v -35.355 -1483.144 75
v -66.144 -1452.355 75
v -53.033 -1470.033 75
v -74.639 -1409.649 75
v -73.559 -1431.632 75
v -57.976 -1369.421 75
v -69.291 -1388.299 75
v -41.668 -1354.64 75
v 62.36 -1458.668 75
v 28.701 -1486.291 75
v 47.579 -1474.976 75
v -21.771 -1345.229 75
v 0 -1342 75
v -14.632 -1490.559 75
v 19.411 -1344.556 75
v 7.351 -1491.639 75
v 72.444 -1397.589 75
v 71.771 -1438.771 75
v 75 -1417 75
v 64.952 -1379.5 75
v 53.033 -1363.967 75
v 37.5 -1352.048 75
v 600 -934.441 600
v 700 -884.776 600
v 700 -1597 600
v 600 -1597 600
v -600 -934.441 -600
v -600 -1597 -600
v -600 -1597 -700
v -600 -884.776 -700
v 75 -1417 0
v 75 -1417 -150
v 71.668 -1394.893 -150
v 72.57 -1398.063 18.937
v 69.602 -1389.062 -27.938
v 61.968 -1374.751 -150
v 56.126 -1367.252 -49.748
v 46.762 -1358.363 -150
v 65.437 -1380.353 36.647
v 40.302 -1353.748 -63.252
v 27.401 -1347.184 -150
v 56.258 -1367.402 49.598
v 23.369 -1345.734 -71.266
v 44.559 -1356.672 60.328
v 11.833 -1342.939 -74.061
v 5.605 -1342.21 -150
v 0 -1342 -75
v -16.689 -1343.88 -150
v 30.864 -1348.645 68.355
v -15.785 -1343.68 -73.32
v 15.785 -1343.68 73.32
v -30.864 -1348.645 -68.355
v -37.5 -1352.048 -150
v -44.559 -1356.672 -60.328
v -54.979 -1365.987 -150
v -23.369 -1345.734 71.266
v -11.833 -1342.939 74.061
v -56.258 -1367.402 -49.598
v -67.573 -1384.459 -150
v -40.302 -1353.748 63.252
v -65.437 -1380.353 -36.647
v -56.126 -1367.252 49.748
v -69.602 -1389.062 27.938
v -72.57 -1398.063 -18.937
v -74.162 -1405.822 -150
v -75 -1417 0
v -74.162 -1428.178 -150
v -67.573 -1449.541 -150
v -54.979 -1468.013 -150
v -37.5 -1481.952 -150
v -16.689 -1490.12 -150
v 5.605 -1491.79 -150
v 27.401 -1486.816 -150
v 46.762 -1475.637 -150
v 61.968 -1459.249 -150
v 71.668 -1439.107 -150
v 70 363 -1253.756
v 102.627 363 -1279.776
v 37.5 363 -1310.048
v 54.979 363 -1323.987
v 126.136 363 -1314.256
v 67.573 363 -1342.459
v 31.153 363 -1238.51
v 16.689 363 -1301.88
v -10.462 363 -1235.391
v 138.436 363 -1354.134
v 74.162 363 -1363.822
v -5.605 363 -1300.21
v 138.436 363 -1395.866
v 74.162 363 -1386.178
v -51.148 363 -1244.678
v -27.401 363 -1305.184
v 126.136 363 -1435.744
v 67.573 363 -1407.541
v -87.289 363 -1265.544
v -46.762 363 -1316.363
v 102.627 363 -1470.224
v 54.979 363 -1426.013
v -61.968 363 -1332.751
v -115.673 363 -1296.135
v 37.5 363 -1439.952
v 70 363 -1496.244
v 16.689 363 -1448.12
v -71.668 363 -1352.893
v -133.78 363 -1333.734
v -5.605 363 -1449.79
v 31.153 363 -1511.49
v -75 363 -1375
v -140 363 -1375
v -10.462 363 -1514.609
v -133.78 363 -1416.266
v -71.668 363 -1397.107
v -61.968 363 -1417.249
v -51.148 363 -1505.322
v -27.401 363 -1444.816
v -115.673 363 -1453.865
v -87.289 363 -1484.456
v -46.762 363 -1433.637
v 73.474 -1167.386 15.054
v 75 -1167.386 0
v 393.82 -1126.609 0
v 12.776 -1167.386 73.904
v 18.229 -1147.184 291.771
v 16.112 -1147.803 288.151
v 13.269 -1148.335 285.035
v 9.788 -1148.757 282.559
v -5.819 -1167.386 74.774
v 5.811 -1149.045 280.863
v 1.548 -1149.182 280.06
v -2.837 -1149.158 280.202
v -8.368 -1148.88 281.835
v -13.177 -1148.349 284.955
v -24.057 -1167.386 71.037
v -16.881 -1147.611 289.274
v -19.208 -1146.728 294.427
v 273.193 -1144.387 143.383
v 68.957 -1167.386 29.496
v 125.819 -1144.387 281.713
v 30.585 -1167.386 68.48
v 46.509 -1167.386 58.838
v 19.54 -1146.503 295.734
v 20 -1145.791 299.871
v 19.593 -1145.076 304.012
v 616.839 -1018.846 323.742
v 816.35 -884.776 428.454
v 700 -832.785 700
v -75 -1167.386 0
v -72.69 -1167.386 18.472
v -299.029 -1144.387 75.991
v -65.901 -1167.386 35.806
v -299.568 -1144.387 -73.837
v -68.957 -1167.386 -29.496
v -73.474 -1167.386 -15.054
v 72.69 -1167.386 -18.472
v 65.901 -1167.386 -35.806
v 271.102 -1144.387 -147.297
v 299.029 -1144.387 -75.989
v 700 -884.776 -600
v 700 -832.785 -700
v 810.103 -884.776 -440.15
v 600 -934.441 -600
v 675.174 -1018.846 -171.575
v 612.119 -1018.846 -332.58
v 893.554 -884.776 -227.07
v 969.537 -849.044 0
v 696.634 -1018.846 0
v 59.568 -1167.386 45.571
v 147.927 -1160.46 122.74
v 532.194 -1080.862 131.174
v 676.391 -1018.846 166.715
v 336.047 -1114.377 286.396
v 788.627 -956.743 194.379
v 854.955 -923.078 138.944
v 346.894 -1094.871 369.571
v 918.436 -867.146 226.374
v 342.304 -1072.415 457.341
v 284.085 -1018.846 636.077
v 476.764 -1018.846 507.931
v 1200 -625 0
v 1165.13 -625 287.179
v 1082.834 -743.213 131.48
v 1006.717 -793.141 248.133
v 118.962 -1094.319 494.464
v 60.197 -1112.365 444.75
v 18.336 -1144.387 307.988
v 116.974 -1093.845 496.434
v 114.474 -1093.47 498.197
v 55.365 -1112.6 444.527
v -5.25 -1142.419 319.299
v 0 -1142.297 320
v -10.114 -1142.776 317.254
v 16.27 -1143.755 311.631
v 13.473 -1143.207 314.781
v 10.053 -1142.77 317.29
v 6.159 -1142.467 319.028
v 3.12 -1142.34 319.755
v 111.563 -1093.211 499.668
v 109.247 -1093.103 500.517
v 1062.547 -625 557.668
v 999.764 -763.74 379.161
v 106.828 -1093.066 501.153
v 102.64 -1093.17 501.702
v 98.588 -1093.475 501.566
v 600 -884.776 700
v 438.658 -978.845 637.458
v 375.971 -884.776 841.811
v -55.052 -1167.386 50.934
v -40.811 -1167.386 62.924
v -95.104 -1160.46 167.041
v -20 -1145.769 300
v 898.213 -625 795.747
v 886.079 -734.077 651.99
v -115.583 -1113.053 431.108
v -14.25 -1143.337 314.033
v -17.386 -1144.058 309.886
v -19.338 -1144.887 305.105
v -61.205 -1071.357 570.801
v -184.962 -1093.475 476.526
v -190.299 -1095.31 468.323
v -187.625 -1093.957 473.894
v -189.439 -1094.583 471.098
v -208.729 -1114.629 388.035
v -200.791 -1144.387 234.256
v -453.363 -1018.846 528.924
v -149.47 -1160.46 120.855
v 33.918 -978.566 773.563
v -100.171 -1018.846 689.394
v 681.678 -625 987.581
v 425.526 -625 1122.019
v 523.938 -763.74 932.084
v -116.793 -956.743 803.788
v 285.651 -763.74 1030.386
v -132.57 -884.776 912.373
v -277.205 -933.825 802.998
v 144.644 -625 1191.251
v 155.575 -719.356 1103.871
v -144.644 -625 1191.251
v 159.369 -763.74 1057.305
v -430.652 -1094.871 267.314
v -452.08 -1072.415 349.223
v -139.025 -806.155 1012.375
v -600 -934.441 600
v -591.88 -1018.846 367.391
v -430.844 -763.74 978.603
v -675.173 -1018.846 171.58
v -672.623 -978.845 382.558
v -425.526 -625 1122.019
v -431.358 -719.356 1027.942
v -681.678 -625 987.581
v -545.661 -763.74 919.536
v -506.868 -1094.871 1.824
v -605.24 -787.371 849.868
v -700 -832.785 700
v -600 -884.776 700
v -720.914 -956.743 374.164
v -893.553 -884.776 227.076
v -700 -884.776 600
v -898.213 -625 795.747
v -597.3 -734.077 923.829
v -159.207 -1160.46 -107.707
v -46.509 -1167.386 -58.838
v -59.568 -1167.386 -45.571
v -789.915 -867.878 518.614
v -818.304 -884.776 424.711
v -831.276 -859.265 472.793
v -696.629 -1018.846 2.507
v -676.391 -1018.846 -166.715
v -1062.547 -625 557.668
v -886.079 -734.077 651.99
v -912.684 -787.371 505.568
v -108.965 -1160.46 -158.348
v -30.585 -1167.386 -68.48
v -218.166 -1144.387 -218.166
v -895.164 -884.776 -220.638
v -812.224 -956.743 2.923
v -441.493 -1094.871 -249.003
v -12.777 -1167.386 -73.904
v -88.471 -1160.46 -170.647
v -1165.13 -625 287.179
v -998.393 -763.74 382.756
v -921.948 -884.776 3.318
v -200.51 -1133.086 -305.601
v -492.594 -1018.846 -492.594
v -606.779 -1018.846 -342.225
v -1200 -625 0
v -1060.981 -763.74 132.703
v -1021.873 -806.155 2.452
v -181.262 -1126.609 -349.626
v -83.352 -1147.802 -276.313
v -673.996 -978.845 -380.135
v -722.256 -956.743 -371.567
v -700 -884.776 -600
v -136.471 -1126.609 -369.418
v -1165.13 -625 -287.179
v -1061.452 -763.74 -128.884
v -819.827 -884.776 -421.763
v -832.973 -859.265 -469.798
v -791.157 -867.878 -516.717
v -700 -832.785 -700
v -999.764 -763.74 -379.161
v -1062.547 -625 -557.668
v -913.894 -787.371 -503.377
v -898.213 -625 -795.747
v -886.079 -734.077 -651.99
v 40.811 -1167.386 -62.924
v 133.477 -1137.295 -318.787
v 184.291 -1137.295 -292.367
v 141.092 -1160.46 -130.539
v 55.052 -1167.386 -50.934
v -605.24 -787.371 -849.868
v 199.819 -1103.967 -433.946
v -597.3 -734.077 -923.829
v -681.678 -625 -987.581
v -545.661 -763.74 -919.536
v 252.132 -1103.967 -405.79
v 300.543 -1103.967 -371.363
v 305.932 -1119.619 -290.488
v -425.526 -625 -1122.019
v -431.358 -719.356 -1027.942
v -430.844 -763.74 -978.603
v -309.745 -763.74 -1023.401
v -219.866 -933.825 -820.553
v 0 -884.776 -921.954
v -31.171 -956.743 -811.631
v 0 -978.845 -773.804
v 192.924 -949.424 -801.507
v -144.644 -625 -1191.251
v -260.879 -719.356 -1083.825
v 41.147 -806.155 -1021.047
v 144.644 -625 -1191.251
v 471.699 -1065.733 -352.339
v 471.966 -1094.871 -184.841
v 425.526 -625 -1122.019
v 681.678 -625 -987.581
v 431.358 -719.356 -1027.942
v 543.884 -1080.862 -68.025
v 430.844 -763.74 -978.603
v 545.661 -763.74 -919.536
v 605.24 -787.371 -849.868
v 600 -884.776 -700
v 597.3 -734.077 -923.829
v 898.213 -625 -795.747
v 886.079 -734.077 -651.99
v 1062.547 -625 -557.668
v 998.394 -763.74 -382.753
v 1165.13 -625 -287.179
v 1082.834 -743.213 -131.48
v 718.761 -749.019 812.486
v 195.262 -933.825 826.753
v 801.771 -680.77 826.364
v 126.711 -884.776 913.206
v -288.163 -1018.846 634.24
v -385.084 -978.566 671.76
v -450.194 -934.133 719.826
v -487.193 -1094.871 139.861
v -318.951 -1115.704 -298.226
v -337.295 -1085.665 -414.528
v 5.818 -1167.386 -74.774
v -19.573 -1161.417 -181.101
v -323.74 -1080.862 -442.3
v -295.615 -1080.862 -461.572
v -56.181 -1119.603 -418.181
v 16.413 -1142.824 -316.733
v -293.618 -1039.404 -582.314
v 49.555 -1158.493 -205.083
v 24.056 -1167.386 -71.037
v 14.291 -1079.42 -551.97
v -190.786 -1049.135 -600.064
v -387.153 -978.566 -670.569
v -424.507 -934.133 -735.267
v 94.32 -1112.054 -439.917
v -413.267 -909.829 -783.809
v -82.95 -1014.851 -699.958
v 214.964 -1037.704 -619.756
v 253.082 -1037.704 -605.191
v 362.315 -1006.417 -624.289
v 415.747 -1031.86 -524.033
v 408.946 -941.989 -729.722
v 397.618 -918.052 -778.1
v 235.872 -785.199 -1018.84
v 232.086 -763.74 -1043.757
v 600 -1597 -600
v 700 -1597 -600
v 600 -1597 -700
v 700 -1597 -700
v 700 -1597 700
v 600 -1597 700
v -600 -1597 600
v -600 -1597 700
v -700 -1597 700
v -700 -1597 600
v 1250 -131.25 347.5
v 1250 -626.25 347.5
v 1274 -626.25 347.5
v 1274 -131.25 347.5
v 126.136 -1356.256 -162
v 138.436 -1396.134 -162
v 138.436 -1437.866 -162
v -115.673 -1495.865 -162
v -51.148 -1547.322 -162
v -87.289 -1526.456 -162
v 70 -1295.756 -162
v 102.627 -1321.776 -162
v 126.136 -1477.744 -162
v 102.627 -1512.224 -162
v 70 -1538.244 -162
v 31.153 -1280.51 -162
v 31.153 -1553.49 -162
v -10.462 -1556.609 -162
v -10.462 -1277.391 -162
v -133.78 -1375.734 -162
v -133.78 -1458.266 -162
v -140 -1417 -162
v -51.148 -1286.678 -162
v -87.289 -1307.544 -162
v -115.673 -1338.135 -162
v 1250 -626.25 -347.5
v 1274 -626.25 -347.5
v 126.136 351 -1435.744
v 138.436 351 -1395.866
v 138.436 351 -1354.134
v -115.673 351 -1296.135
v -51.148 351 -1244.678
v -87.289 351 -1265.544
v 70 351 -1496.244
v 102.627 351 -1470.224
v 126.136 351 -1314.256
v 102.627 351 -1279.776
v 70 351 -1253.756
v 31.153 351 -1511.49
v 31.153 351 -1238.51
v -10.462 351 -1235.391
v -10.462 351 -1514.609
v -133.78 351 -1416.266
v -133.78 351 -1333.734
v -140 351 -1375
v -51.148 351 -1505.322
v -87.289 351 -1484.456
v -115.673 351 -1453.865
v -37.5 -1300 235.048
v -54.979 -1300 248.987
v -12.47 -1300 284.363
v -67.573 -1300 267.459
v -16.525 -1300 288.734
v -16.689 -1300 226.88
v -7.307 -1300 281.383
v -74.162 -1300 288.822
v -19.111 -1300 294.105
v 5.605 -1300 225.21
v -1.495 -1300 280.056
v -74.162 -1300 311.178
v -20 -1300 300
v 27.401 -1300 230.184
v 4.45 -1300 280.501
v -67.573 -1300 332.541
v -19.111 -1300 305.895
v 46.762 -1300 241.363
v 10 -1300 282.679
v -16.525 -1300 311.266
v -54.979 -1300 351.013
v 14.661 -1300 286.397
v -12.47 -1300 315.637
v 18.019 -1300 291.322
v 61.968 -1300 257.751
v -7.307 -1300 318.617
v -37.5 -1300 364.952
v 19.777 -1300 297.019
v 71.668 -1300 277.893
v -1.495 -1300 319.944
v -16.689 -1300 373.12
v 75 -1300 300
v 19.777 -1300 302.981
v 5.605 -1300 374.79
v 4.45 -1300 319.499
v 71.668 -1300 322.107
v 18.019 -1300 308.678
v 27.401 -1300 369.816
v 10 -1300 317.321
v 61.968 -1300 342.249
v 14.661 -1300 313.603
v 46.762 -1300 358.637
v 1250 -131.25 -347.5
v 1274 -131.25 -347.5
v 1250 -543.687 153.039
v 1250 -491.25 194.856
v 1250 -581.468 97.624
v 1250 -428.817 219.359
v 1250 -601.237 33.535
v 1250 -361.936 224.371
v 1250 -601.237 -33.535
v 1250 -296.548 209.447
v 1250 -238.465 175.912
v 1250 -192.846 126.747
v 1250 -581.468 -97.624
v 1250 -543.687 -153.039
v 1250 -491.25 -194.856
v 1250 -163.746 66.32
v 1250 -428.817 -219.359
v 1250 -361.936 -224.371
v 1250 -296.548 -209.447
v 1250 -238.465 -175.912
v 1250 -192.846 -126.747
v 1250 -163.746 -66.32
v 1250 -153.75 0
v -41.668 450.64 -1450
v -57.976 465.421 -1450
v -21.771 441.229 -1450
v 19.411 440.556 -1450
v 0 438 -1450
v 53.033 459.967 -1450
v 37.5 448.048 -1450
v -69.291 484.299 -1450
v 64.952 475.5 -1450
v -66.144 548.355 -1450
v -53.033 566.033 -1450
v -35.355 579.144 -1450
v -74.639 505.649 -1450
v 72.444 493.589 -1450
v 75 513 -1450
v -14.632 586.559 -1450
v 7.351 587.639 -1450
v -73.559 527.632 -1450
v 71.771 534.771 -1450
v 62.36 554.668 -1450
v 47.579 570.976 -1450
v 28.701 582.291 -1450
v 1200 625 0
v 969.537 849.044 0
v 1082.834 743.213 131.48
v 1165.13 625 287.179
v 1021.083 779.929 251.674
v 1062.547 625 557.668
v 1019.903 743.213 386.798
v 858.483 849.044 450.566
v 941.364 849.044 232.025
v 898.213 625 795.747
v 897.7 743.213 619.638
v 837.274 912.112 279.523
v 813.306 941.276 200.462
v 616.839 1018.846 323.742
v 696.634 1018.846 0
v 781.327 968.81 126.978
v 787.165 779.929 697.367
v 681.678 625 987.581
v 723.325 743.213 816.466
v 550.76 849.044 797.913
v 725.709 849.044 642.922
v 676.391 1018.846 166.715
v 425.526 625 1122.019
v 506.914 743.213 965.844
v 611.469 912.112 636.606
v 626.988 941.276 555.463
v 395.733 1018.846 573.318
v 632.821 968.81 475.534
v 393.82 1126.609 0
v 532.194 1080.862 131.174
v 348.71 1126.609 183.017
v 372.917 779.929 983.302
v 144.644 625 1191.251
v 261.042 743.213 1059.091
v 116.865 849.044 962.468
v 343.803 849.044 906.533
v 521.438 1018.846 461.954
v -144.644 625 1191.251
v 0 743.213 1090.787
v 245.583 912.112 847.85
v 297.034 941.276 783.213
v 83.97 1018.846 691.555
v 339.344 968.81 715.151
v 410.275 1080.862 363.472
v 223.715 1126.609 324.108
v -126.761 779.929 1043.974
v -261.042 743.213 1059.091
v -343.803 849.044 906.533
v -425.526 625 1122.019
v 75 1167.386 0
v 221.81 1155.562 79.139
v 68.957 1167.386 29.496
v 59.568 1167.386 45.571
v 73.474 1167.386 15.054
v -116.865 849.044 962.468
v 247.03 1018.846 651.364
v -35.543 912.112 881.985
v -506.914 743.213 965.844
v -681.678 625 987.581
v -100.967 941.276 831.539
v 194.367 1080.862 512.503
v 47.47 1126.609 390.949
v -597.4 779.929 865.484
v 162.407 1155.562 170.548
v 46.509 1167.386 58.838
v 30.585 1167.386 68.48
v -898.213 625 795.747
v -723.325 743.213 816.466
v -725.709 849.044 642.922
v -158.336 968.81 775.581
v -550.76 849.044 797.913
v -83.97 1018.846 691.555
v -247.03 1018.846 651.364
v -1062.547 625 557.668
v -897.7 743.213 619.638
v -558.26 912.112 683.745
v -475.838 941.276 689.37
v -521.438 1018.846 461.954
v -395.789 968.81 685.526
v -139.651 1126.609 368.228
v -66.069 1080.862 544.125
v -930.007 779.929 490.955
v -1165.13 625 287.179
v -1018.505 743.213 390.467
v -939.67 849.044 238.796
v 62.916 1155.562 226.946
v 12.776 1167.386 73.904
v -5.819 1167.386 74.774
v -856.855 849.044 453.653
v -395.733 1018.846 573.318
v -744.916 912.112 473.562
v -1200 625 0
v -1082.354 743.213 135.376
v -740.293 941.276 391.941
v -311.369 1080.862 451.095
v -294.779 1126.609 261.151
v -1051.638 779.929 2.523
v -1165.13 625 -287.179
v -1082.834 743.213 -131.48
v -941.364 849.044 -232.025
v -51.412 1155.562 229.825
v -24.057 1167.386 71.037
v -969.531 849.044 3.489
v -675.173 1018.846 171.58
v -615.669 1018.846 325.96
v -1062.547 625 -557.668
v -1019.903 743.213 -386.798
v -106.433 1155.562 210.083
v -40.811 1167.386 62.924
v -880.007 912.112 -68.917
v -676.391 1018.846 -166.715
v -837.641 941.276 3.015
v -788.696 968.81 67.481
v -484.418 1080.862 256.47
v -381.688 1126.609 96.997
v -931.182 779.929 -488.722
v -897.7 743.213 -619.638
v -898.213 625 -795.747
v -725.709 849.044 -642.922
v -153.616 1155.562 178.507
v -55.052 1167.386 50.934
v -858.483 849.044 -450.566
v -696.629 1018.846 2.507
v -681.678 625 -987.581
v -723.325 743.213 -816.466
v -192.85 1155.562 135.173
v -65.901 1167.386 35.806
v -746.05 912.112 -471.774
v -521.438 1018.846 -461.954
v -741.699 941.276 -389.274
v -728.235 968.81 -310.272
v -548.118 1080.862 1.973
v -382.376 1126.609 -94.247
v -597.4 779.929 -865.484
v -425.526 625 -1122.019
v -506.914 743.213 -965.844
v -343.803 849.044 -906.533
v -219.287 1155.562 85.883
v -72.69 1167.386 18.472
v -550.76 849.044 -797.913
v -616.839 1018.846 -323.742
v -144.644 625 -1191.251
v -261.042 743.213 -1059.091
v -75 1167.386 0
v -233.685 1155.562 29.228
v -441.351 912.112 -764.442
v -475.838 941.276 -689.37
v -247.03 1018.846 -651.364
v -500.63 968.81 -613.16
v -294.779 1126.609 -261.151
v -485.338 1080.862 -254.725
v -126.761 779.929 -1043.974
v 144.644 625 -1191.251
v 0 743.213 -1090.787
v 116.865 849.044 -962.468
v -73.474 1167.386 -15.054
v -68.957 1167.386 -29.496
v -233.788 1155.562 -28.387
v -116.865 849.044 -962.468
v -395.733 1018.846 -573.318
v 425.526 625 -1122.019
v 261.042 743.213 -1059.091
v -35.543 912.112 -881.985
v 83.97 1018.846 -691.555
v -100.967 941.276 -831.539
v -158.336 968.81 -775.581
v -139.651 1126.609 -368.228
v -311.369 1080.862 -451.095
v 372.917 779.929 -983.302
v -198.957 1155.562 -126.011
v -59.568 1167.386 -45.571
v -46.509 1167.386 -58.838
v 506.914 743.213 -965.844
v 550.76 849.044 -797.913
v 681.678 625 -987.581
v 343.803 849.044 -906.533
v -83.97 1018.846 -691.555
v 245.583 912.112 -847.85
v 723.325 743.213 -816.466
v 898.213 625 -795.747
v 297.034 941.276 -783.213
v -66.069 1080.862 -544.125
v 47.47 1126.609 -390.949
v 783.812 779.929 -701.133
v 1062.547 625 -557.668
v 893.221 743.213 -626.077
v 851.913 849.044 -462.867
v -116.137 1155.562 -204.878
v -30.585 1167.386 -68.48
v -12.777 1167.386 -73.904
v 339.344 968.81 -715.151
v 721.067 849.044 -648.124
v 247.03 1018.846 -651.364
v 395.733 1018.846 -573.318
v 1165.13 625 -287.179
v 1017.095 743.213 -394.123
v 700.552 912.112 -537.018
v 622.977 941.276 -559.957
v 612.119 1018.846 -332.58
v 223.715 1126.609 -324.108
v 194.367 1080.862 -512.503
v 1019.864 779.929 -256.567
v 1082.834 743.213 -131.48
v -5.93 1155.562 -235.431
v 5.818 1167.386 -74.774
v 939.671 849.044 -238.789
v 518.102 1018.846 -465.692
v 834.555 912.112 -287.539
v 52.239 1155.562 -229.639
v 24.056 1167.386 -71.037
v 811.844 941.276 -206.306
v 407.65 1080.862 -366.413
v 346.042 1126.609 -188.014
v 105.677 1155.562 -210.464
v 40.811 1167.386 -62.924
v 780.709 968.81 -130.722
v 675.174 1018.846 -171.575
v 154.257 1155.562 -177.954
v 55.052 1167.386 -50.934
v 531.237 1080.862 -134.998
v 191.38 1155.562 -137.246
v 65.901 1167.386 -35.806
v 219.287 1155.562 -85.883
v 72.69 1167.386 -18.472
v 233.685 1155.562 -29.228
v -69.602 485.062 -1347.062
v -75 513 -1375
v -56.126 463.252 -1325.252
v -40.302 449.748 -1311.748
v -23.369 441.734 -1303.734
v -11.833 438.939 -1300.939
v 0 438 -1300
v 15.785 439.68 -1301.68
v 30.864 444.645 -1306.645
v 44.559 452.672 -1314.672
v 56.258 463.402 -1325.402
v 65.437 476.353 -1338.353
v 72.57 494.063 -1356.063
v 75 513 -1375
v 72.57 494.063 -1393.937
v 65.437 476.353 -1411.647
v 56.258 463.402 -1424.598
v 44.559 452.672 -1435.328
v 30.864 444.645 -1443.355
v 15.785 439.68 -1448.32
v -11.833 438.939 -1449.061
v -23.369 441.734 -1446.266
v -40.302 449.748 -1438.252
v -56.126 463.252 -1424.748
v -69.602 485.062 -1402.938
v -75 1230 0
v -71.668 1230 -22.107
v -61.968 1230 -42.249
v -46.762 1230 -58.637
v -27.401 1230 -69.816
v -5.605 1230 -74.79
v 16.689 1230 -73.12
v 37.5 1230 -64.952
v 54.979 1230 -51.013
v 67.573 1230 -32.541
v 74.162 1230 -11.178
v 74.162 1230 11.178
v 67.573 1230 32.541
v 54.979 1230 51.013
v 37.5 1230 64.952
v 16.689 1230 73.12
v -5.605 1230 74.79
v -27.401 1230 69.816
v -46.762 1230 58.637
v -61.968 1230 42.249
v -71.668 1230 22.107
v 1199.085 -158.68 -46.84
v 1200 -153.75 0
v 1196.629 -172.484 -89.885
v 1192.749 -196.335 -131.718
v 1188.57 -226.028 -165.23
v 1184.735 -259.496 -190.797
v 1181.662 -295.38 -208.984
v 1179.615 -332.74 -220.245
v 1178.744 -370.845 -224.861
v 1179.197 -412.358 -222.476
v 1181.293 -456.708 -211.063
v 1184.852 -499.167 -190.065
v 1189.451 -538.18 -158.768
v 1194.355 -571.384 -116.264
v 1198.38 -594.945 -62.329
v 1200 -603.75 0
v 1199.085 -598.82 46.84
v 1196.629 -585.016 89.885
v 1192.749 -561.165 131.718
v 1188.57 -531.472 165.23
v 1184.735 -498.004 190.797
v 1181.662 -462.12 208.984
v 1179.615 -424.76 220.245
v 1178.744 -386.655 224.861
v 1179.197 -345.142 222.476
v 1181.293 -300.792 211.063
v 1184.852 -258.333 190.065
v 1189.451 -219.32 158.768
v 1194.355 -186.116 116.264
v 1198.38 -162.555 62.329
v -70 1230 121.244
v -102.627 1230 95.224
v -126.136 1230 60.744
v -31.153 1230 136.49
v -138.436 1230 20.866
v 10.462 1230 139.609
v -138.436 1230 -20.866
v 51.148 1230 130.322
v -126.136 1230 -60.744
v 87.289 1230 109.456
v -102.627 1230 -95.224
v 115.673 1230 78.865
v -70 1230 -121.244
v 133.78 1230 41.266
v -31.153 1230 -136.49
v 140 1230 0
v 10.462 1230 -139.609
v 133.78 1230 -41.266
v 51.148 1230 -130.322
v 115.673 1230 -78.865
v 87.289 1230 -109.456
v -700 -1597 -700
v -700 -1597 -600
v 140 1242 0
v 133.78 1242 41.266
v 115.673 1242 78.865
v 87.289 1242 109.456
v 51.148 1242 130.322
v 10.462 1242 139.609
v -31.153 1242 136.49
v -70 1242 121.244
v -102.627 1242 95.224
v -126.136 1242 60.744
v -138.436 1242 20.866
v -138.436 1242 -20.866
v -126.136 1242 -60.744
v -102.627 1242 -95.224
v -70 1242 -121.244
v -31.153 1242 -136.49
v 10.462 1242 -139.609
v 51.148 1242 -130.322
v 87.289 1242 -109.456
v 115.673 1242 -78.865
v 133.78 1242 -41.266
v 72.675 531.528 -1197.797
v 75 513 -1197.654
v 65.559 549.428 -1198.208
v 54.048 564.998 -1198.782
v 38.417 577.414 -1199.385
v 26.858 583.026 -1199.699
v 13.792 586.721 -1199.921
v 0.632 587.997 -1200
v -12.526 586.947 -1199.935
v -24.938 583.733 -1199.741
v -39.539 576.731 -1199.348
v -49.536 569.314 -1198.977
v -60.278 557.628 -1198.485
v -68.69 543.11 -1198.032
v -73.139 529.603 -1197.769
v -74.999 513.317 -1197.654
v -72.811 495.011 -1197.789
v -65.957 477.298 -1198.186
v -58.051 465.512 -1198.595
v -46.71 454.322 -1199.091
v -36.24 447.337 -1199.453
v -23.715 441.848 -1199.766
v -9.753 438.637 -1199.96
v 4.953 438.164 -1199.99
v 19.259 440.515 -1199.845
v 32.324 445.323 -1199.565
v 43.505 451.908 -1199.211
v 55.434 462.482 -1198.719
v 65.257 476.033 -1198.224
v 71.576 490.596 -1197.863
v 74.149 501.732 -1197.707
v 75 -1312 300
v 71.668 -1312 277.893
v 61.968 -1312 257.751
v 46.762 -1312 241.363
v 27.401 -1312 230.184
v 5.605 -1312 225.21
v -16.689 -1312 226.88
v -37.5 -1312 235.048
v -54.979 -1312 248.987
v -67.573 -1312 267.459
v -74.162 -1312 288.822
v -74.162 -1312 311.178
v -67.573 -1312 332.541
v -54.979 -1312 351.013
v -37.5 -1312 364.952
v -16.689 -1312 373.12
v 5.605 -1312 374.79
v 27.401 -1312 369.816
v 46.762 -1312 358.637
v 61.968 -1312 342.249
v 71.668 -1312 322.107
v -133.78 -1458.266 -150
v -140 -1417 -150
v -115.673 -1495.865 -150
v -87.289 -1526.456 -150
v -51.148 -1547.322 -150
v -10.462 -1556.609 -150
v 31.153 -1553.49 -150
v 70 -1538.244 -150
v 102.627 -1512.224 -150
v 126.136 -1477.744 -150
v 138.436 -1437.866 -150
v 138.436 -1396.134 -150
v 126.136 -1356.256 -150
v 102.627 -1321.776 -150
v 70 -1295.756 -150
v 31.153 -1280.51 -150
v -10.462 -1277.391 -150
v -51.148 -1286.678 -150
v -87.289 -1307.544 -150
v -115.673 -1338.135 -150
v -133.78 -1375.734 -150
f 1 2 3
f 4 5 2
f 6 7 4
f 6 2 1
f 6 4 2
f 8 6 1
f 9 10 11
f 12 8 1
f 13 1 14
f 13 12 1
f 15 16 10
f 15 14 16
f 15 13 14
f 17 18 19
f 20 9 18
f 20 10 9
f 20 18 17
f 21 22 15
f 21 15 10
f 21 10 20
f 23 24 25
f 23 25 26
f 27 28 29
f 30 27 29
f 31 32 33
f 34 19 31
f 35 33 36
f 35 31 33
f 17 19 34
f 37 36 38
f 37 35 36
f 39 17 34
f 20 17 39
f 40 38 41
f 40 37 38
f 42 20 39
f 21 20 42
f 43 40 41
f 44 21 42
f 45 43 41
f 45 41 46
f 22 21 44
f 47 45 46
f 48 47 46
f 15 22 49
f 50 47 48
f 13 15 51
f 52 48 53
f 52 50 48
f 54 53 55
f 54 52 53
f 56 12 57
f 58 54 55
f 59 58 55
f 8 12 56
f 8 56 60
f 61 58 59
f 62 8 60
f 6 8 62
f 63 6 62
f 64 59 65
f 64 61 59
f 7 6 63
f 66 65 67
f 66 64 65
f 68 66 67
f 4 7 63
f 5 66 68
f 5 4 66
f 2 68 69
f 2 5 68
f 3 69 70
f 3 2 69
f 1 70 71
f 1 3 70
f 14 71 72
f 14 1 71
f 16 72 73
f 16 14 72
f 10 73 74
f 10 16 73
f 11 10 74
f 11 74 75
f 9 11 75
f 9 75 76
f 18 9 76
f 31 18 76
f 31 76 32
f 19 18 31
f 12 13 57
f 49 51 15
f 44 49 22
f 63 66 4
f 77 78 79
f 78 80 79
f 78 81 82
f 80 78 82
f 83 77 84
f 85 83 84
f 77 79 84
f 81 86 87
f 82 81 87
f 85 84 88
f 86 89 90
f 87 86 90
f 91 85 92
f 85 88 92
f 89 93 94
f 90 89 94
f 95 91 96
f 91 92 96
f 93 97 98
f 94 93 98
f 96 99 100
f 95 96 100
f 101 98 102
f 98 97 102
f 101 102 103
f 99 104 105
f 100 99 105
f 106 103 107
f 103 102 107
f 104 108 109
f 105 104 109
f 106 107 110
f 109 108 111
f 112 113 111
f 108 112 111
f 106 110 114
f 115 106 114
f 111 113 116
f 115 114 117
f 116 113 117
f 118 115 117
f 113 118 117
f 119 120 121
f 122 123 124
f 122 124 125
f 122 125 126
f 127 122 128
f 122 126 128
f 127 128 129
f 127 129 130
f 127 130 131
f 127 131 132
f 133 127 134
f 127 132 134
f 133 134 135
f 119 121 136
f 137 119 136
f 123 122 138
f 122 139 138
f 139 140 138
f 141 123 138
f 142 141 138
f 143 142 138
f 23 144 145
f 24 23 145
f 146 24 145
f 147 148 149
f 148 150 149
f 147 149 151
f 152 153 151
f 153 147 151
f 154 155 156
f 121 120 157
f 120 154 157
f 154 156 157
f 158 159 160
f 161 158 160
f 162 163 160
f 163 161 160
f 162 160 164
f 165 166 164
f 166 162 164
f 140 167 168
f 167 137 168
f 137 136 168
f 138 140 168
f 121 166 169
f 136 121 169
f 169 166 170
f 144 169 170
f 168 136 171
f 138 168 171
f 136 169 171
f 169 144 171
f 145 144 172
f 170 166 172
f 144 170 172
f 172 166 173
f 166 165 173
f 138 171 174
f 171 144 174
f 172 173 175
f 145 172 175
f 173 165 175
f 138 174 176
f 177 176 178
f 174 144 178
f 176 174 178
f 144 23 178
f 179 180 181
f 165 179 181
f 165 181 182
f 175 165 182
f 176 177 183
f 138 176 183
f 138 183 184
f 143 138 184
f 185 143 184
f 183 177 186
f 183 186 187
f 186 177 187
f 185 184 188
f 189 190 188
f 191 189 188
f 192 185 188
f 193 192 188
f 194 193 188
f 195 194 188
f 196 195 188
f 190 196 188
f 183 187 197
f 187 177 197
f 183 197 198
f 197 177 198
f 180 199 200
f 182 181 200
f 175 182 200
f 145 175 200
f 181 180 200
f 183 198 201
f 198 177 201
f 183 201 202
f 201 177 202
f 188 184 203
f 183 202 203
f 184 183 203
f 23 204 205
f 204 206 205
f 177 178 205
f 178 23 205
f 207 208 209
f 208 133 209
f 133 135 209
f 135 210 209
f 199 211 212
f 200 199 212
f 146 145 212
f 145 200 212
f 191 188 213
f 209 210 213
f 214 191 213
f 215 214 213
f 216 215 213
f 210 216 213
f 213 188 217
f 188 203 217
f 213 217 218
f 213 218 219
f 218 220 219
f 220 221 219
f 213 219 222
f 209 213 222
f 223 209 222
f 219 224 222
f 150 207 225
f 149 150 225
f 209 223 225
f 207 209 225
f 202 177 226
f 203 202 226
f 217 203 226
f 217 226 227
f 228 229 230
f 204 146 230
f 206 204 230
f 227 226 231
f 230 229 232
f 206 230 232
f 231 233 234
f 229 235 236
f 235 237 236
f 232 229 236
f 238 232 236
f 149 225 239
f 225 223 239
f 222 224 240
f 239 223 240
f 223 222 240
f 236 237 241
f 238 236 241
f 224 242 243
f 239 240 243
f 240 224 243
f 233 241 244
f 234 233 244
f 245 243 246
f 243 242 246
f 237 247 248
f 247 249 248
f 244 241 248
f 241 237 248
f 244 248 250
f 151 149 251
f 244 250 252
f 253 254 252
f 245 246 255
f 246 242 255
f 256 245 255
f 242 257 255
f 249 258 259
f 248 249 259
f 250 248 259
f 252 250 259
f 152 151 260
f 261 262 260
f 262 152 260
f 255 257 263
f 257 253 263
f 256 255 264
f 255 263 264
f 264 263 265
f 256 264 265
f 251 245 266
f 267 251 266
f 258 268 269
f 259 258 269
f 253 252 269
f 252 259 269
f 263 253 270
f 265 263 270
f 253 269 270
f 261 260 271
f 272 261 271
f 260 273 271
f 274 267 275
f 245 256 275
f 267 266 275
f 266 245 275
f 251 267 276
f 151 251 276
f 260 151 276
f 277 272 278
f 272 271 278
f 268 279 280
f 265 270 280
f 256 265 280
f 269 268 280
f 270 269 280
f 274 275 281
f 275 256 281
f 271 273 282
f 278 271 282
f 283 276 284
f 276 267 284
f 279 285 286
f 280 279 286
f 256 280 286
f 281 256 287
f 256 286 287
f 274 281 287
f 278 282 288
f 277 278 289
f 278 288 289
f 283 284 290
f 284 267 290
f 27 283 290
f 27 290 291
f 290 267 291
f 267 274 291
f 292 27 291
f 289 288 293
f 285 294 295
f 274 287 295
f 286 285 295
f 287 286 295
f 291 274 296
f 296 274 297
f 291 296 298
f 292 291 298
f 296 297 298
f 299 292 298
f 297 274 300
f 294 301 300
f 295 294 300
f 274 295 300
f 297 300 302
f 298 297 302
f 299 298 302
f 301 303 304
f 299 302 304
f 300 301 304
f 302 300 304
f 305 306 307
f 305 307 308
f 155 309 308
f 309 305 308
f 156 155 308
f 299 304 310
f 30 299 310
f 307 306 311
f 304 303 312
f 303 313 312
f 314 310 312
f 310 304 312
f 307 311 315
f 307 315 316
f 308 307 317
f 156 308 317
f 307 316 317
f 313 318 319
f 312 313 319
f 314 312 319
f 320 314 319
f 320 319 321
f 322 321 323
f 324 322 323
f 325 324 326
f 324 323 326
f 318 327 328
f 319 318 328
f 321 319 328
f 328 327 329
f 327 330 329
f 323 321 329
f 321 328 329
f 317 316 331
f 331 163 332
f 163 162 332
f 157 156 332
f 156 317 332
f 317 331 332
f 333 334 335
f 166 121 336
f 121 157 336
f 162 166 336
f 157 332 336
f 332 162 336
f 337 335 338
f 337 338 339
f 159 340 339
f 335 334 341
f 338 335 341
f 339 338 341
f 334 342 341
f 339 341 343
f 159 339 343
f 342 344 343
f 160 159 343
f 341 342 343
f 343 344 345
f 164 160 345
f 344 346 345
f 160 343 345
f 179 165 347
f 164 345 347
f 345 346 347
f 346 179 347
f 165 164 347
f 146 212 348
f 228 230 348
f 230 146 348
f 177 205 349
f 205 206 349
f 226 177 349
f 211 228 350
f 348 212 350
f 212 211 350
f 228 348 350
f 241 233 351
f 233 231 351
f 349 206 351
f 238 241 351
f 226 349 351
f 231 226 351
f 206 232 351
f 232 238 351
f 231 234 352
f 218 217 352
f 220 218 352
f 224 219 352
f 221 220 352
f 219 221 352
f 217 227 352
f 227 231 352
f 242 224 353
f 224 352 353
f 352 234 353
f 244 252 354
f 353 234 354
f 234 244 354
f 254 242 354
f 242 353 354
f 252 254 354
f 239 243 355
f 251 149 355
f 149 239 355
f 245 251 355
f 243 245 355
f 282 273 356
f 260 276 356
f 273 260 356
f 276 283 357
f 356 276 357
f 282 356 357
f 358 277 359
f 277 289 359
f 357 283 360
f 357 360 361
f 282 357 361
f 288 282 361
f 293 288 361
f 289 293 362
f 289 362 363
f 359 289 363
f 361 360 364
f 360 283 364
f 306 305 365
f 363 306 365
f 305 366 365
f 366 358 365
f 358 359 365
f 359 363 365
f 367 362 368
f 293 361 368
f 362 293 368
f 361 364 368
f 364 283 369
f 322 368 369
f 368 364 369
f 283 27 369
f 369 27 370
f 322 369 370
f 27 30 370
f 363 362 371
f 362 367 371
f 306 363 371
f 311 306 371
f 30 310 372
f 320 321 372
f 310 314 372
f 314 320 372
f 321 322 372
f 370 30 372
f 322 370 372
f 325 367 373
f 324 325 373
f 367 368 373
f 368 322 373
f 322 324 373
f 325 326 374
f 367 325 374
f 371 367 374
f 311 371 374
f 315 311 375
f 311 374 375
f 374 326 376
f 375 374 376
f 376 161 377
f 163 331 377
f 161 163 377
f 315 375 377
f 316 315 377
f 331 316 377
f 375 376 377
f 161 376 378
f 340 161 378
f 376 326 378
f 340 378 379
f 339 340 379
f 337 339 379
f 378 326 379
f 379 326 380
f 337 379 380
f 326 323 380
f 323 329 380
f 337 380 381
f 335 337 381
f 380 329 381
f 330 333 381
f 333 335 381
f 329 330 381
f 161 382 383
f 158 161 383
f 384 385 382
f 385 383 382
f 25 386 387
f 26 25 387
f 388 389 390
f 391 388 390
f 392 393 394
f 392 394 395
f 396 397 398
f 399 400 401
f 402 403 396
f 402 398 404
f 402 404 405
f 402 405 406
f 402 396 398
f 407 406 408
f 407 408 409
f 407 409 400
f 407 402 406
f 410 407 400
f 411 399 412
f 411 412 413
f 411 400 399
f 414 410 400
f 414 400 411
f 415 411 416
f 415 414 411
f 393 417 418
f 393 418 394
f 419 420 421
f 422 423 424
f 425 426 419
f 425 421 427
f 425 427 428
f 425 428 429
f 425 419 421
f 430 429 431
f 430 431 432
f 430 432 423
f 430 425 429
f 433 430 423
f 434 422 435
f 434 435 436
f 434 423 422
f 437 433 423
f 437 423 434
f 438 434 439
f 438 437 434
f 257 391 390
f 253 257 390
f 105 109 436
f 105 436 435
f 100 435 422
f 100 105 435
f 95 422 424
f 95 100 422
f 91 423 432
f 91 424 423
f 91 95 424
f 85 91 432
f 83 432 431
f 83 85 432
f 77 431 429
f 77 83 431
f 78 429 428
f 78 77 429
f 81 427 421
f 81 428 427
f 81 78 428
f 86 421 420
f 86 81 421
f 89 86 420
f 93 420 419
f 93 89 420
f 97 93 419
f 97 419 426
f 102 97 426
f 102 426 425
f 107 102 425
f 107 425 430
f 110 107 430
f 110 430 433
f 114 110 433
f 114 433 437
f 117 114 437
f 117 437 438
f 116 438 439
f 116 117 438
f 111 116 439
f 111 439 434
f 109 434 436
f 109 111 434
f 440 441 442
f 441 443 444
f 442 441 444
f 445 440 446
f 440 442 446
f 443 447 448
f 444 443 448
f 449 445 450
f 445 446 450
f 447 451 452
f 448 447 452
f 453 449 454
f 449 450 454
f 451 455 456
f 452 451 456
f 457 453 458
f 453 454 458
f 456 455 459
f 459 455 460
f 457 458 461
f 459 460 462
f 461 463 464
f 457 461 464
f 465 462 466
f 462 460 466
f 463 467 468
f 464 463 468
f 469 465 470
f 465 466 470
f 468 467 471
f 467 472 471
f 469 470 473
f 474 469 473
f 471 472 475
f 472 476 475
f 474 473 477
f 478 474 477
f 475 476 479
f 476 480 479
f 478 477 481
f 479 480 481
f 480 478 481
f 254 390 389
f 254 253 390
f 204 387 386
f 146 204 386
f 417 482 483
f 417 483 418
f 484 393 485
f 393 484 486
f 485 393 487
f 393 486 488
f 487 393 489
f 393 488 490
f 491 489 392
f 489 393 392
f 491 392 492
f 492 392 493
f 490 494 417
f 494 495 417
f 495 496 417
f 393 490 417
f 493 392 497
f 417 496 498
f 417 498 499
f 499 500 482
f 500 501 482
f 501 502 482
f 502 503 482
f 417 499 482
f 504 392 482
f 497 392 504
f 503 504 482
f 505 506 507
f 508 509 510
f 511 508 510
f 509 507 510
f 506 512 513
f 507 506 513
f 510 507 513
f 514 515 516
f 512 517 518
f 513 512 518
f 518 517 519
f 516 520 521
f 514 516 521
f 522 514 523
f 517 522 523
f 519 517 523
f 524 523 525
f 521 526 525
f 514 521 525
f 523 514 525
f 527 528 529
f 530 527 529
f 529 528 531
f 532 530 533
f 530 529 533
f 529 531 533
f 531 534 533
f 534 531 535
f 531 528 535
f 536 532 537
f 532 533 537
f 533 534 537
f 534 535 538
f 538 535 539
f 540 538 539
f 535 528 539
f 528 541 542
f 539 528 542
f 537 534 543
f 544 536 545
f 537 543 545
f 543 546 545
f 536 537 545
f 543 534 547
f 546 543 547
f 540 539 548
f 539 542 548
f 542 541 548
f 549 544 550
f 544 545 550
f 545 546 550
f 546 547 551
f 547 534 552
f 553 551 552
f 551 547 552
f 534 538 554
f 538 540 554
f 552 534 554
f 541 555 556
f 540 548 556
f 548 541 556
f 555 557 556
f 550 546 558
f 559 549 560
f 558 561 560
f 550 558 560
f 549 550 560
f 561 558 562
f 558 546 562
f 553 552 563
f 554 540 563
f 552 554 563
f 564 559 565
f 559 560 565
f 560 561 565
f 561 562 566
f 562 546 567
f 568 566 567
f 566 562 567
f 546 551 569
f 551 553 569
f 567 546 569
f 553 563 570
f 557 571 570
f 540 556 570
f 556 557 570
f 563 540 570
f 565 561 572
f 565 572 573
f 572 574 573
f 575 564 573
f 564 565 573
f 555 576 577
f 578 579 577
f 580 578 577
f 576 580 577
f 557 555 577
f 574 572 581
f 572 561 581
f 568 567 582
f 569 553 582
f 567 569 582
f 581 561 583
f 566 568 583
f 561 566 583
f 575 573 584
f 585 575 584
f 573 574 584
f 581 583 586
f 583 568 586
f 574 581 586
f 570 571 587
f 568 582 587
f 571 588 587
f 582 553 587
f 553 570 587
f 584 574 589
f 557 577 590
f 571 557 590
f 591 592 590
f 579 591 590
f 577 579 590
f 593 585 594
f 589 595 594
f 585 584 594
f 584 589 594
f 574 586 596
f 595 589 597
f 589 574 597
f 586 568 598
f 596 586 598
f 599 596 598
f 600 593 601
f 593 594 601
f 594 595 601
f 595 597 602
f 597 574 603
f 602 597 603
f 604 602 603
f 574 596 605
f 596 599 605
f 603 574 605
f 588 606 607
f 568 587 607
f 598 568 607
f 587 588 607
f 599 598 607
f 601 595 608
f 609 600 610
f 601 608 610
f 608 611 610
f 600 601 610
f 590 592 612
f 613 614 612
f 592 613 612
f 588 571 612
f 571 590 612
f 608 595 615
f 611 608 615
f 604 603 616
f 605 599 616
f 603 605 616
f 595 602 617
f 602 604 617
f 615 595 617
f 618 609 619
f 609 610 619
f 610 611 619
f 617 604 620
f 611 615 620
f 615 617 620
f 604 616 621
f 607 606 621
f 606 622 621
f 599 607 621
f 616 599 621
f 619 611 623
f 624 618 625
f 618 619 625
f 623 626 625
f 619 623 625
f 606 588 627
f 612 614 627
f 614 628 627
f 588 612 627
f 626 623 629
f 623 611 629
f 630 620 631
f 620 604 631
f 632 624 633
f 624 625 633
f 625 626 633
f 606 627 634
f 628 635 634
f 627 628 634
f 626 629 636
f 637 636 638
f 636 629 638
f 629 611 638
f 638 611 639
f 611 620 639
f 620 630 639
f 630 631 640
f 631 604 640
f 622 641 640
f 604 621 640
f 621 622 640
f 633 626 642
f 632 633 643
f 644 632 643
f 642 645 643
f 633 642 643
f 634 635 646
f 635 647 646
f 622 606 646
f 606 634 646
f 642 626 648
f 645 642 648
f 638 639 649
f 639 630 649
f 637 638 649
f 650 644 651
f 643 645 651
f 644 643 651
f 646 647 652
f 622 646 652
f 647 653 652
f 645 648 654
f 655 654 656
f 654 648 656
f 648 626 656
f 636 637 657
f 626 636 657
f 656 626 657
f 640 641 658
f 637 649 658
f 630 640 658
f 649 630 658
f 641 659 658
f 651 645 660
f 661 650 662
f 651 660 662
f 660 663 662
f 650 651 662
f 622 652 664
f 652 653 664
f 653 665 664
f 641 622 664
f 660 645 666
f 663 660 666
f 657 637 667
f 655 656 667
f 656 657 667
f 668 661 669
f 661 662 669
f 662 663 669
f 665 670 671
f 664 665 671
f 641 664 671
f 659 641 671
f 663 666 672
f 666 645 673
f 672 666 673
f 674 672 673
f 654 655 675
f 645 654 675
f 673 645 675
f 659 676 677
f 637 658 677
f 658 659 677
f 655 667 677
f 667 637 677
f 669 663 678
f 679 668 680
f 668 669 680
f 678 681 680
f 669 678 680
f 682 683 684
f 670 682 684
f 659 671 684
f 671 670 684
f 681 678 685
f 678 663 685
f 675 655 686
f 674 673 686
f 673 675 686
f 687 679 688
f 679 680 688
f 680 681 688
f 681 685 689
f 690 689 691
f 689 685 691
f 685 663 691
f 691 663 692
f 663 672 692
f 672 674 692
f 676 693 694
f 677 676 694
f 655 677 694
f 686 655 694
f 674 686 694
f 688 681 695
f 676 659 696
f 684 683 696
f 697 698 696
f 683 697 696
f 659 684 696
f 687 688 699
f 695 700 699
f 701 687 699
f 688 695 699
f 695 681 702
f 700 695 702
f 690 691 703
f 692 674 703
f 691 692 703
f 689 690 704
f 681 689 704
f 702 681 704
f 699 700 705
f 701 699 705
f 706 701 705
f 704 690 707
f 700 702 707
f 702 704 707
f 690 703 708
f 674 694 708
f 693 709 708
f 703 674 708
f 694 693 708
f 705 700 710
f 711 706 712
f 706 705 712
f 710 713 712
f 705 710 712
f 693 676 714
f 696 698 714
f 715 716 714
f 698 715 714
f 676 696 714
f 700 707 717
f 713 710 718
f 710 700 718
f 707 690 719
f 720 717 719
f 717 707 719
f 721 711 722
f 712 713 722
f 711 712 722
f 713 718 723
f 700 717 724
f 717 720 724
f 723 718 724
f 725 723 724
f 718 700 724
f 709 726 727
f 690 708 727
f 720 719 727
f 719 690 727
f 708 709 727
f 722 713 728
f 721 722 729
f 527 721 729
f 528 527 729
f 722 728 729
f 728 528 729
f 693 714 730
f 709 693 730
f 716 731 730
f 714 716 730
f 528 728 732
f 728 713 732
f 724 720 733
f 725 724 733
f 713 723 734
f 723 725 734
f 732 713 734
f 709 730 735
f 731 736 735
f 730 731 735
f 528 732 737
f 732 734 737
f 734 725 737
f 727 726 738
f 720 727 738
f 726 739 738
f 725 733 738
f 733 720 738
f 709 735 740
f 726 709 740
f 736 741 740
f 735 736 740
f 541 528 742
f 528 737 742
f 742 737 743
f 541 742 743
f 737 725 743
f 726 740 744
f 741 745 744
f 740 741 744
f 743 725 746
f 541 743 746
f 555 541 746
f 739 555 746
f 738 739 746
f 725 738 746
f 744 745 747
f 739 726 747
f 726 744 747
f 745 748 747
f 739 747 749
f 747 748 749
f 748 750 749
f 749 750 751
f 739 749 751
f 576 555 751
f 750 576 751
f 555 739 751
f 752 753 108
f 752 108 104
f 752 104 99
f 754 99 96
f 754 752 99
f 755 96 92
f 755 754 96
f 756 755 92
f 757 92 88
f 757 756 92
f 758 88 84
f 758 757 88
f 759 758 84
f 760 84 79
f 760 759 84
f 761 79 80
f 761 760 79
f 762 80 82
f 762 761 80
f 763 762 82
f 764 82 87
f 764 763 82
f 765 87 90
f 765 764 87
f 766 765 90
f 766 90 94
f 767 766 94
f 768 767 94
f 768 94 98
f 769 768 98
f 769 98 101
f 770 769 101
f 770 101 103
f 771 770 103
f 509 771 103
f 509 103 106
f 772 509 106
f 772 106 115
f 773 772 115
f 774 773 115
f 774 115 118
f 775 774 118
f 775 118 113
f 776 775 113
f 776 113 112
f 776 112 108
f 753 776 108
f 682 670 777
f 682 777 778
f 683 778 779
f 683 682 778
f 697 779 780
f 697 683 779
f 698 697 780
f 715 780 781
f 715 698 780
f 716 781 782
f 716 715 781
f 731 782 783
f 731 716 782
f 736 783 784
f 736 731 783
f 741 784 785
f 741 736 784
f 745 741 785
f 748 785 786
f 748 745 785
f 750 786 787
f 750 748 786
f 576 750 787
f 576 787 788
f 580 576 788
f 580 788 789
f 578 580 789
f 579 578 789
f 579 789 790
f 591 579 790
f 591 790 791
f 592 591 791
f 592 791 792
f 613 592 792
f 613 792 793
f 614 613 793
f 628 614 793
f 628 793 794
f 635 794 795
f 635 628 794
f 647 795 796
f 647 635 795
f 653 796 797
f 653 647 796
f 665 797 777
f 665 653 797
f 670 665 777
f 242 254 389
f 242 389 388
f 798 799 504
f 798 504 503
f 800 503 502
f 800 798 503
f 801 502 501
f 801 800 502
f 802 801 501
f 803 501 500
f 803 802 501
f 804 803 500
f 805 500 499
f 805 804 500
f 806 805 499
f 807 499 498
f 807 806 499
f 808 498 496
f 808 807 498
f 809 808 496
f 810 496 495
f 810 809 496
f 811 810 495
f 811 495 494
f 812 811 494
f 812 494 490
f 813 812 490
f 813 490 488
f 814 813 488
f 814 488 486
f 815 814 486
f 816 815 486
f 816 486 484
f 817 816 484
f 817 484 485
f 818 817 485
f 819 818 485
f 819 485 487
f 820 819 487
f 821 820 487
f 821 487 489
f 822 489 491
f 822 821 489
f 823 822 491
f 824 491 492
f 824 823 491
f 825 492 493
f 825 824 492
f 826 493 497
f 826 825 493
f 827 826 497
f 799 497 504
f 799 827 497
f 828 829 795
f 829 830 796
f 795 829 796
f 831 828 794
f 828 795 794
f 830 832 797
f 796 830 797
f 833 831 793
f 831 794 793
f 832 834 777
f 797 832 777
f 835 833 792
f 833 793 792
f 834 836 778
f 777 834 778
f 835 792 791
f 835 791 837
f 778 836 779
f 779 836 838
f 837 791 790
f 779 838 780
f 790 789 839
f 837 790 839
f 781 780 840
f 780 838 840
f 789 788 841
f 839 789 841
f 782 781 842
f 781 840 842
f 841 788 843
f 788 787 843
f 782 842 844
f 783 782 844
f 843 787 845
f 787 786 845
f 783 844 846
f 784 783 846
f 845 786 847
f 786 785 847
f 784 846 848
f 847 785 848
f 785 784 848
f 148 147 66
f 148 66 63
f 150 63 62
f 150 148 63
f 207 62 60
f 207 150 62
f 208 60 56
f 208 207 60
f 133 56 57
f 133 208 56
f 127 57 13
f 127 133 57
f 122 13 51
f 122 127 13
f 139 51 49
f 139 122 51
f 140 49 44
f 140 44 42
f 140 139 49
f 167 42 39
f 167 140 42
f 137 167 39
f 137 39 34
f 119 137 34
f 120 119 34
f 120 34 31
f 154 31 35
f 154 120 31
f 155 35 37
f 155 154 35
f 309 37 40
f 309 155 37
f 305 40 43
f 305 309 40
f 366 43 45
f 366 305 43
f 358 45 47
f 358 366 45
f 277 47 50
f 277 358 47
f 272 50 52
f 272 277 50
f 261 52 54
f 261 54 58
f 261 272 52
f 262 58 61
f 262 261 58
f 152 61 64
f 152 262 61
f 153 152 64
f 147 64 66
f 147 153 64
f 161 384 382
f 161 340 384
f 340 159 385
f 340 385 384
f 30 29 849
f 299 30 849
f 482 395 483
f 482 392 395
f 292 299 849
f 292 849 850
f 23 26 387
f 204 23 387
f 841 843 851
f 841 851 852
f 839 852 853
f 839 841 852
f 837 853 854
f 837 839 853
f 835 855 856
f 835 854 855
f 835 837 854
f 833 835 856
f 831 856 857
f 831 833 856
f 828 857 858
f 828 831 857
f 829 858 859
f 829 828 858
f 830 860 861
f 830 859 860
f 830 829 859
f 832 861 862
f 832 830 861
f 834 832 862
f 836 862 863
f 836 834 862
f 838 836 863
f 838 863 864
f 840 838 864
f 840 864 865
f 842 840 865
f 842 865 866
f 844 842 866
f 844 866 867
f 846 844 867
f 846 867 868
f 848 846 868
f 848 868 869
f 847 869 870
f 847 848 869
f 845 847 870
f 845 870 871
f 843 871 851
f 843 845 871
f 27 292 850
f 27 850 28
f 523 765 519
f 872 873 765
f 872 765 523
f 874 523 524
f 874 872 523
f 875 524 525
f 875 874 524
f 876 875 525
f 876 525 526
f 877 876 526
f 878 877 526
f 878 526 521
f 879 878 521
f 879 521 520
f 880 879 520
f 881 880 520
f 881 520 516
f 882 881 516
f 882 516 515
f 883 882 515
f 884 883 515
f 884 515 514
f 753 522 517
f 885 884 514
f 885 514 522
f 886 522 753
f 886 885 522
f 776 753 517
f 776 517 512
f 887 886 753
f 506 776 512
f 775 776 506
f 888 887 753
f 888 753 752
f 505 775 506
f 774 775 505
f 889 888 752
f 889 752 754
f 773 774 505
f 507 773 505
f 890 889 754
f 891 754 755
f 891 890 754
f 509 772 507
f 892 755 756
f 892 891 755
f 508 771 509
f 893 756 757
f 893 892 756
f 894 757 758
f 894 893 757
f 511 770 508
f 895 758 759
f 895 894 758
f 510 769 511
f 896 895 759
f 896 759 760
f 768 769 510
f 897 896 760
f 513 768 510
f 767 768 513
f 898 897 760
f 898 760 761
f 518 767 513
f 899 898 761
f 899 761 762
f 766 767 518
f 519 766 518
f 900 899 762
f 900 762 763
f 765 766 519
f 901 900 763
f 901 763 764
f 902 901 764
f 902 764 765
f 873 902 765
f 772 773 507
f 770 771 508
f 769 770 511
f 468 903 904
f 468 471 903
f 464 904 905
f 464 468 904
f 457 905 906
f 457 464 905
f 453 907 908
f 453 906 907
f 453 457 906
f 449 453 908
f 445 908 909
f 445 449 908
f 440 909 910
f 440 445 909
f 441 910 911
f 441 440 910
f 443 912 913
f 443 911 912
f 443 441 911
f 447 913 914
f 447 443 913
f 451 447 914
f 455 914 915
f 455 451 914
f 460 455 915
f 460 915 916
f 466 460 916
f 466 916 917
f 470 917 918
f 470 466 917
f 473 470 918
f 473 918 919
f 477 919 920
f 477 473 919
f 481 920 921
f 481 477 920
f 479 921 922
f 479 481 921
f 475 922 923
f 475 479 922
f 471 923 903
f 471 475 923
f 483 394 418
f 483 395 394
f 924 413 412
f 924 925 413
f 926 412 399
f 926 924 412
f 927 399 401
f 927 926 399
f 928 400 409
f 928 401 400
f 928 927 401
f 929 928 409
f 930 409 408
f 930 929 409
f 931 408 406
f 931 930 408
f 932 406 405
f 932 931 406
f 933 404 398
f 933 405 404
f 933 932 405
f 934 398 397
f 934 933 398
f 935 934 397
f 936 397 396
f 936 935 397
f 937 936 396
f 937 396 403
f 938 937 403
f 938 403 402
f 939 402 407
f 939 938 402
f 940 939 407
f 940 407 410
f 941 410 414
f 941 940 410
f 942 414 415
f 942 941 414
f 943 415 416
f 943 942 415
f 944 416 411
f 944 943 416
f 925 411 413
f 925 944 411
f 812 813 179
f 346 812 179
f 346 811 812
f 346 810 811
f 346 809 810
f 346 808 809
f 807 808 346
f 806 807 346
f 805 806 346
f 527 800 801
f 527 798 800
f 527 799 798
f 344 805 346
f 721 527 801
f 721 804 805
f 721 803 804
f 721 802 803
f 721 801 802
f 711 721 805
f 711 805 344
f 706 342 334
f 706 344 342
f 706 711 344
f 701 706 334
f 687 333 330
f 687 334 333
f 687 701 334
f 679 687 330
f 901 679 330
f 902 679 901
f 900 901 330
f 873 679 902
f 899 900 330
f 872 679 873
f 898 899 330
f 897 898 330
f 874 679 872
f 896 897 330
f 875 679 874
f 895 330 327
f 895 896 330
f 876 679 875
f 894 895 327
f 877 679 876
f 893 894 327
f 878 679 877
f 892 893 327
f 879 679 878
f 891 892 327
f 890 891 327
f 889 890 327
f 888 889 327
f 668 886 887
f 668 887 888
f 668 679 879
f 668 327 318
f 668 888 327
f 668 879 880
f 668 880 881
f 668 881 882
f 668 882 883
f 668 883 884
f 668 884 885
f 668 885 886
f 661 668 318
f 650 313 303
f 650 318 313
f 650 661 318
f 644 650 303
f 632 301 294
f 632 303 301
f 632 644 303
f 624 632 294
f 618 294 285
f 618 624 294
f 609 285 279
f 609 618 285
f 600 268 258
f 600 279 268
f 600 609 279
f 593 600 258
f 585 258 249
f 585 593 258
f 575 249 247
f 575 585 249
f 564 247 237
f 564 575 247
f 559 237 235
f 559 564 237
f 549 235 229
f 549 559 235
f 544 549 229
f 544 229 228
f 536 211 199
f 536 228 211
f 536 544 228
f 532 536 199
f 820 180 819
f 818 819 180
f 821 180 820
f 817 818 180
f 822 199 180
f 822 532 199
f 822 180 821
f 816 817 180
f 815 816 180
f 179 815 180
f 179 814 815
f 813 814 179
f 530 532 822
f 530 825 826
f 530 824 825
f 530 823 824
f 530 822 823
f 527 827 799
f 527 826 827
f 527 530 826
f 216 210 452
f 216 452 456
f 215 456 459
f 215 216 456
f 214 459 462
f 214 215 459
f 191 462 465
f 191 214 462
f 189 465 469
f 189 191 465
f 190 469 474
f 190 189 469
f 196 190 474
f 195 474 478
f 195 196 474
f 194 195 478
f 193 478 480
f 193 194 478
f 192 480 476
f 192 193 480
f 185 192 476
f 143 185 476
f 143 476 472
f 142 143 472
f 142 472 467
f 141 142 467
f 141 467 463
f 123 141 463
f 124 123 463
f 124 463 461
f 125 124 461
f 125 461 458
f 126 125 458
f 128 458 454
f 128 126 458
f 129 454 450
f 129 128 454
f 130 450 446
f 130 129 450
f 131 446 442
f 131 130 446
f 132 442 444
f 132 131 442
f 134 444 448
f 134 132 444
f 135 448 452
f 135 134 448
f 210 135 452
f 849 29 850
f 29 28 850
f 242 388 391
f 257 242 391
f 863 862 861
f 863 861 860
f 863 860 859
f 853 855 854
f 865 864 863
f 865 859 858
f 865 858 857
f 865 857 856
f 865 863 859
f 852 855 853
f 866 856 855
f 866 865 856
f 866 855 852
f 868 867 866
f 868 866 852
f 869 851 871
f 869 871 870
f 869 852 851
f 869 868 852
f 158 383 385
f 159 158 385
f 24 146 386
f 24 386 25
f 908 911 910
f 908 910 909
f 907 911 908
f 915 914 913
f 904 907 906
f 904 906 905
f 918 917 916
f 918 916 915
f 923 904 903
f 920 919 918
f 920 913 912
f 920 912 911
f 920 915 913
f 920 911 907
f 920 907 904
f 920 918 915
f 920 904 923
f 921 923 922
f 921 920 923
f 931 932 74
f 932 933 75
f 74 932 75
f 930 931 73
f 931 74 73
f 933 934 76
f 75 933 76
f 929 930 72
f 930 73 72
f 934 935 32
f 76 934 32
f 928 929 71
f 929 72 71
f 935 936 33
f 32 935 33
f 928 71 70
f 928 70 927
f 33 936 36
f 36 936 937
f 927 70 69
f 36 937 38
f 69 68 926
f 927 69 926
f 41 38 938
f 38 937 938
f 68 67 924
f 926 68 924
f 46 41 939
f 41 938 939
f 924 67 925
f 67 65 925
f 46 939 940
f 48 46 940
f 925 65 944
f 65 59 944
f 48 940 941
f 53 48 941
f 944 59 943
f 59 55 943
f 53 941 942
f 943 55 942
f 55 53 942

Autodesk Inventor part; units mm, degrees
ref_plane "YZ Plane" through (0, 0, 0) normal (1, 0, 0) x (0, 1, 0)
ref_plane "XY Plane" through (0, 0, 0) normal (0, 0, 1) x (1, 0, 0)
sketch "Sketch1" plane through (0, 0, 0) normal (0, 0, 1) x (1, 0, 0)
  line L0 (1200, -625) -> (1200, 625)
  line L1 (0, 1167) -> (0, -1167)
  arc A0 (0, -1167) -> (1200, -625) centre (45.2095, 332.3185) ccw
  arc A1 (1200, 625) -> (0, 1167) centre (45.2095, -332.3185) ccw
  point P0 (0, 0)
  point P1 (0, 0)
  dimension "d0" = 1250
  dimension "d1" = 542
  dimension "d2" = 542
  dimension "d3" = 2400
  dimension "d9" = 1500
  dimension "d10" = 1500
revolve "Revolution1" add sketch "Sketch1" angle 360 about axis through (0, 1167, 0) along (0, -1, 0)
sketch "Sketch2" plane through (0, 0, 0) normal (0, 1, 0) x (-1, 0, 0)
  line L0 (650, 650) -> (-650, 650) construction
  line L1 (-650, 650) -> (-650, -650) construction
  line L2 (-650, -650) -> (650, -650) construction
  line L3 (650, -650) -> (650, 650) construction
  line L4 (650, 650) -> (-650, -650) construction
  line L5 (700, 700) -> (600, 700)
  line L6 (600, 700) -> (600, 600)
  line L7 (600, 600) -> (700, 600)
  line L8 (700, 600) -> (700, 700)
  line L9 (700, 700) -> (600, 600)
  line L10 (700, -600) -> (600, -600)
  line L11 (600, -600) -> (600, -700)
  line L12 (600, -700) -> (700, -700)
  line L13 (700, -600) -> (600, -700)
  line L14 (700, -700) -> (700, -600)
  line L15 (-600, 700) -> (-700, 700)
  line L16 (-700, 700) -> (-700, 600)
  line L17 (-700, 600) -> (-600, 600)
  line L18 (-600, 700) -> (-700, 600)
  line L19 (-600, 600) -> (-600, 700)
  line L20 (-600, -600) -> (-700, -600)
  line L21 (-700, -600) -> (-700, -700)
  line L22 (-700, -700) -> (-600, -700)
  line L23 (-600, -600) -> (-700, -700)
  line L24 (-600, -700) -> (-600, -600)
  point P0 (0, 0)
  point P1 (0, 0)
  point P2 (650, -650)
  point P3 (0, -1300)
  point P4 (-650, 650)
  point P5 (-1300, 0)
  point P6 (-650, -650)
  point P7 (-1300, -1300)
  dimension "d12" = 1300
  dimension "d13" = 1300
  dimension "d16" = 100
  dimension "d17" = 100
  dimension "d24" = 1300
  dimension "d27" = 1300
extrude "Extrusion1" add sketch "Sketch2" against normal blind 1597
sketch "Sketch3" plane through (0, 0, 0) normal (0, 1, 0) x (-1, 0, 0)
  circle A0 centre (0, 0) radius 75
  dimension "d32" = 150
extrude "Extrusion2" add sketch "Sketch3" along normal blind 1230
sketch "Sketch4" plane through (0, 1230, 0) normal (0, 1, 0) x (1, 0, 0)
  circle A0 centre (0, 0) radius 140
  dimension "d35" = 280
extrude "Extrusion3" add sketch "Sketch4" along normal blind 12
sketch "Sketch5" plane through (0, 0, 0) normal (1, 0, 0) x (0, 1, 0)
  circle A0 centre (-378.75, 0) radius 225
  point P0 (0, 0)
  dimension "d38" = 378.75
  dimension "d39" = 450
extrude "Extrusion4" add sketch "Sketch5" along normal blind 1250
sketch "Sketch6" plane through (1250, -378.75, 0) normal (1, 0, 0) x (0, 0, -1)
  circle A0 centre (0, 0) radius 225 projected
  line L0 (-347.5, 247.5) -> (347.5, 247.5)
  line L1 (347.5, 247.5) -> (347.5, -247.5)
  line L2 (347.5, -247.5) -> (-347.5, -247.5)
  line L3 (-347.5, -247.5) -> (-347.5, 247.5)
  line L4 (-347.5, 247.5) -> (347.5, -247.5) construction
  point P0 (0, 378.75)
  dimension "d42" = 695
  dimension "d43" = 495
extrude "Extrusion5" add sketch "Sketch6" along normal blind 24 contours A0 | L0 L1 L2 L3
sketch "Sketch7" plane through (0, 0, 0) normal (0, 1, 0) x (-1, 0, 0)
  circle A0 centre (0, 0) radius 75
  dimension "d46" = 150
extrude "Extrusion6" add sketch "Sketch7" against normal blind 1417
sketch "Sketch8" plane through (0, 0, 0) normal (0, 0, 1) x (1, 0, 0)
  line L0 (-75, -1417) -> (75, -1417) projected
  circle A0 centre (0, -1417) radius 75
  point P0 (0, 0)
extrude "Extrusion7" add sketch "Sketch8" along normal blind 75 and the other way blind 150
sketch "Sketch9" plane through (0, -1417, -150) normal (0, 0, -1) x (-1, 0, 0)
  circle A0 centre (0, 0) radius 75 projected
  circle A1 centre (0, 0) radius 140
  point P0 (0, 1417)
  dimension "d53" = 280
extrude "Extrusion8" add sketch "Sketch9" along normal blind 12 contours A0 | A1
sketch "Sketch10" plane through (0, 0, 0) normal (0, 1, 0) x (-1, 0, 0)
  circle A0 centre (0, 300) radius 20
  point P0 (0, 0)
  dimension "d56" = 40
  dimension "d57" = 300
extrude "Extrusion9" add sketch "Sketch10" against normal blind 1300
sketch "Sketch11" plane through (0, -1300, 300) normal (0, -1, 0) x (1, 0, 0)
  circle A0 centre (0, 0) radius 20 projected
  circle A1 centre (0, 0) radius 75
  point P0 (0, -300)
  dimension "d60" = 150
extrude "Extrusion10" add sketch "Sketch11" along normal blind 12 contours A0 | A1
sketch "Sketch12" plane through (0, 0, 0) normal (0, 0, 1) x (1, 0, 0)
  circle A0 centre (0, 513) radius 75
  point P0 (0, 0)
  dimension "d63" = 150
  dimension "d64" = 513
extrude "Extrusion11" add sketch "Sketch12" against normal blind 1450
ref_plane "Work Plane1" through (0, 513, 0) normal (0, 1, 0) x (-1, 0, 0)
sketch "Sketch13" plane through (0, 513, 0) normal (0, 1, 0) x (-1, 0, 0)
  circle A0 centre (0, -1375) radius 75
  line L0 (-75, -1450) -> (75, -1450) projected
  point P0 (0, 0)
  point P1 (0, -1450)
  dimension "d68" = 150
  dimension "d81" = 75
extrude "Extrusion12" add sketch "Sketch13" against normal blind 150
sketch "Sketch15" plane through (0, 363, -1375) normal (0, -1, 0) x (-1, 0, 0)
  circle A0 centre (0, 0) radius 75 projected
  circle A1 centre (0, 0) radius 140
  point P0 (0, -1375)
  dimension "d75" = 280
extrude "Extrusion14" add sketch "Sketch15" along normal blind 12 contours A0 | A1
equation "\"d2\" = d1"
equation "\"d13\" = d12"
properties part number "Фильтр контактный"
